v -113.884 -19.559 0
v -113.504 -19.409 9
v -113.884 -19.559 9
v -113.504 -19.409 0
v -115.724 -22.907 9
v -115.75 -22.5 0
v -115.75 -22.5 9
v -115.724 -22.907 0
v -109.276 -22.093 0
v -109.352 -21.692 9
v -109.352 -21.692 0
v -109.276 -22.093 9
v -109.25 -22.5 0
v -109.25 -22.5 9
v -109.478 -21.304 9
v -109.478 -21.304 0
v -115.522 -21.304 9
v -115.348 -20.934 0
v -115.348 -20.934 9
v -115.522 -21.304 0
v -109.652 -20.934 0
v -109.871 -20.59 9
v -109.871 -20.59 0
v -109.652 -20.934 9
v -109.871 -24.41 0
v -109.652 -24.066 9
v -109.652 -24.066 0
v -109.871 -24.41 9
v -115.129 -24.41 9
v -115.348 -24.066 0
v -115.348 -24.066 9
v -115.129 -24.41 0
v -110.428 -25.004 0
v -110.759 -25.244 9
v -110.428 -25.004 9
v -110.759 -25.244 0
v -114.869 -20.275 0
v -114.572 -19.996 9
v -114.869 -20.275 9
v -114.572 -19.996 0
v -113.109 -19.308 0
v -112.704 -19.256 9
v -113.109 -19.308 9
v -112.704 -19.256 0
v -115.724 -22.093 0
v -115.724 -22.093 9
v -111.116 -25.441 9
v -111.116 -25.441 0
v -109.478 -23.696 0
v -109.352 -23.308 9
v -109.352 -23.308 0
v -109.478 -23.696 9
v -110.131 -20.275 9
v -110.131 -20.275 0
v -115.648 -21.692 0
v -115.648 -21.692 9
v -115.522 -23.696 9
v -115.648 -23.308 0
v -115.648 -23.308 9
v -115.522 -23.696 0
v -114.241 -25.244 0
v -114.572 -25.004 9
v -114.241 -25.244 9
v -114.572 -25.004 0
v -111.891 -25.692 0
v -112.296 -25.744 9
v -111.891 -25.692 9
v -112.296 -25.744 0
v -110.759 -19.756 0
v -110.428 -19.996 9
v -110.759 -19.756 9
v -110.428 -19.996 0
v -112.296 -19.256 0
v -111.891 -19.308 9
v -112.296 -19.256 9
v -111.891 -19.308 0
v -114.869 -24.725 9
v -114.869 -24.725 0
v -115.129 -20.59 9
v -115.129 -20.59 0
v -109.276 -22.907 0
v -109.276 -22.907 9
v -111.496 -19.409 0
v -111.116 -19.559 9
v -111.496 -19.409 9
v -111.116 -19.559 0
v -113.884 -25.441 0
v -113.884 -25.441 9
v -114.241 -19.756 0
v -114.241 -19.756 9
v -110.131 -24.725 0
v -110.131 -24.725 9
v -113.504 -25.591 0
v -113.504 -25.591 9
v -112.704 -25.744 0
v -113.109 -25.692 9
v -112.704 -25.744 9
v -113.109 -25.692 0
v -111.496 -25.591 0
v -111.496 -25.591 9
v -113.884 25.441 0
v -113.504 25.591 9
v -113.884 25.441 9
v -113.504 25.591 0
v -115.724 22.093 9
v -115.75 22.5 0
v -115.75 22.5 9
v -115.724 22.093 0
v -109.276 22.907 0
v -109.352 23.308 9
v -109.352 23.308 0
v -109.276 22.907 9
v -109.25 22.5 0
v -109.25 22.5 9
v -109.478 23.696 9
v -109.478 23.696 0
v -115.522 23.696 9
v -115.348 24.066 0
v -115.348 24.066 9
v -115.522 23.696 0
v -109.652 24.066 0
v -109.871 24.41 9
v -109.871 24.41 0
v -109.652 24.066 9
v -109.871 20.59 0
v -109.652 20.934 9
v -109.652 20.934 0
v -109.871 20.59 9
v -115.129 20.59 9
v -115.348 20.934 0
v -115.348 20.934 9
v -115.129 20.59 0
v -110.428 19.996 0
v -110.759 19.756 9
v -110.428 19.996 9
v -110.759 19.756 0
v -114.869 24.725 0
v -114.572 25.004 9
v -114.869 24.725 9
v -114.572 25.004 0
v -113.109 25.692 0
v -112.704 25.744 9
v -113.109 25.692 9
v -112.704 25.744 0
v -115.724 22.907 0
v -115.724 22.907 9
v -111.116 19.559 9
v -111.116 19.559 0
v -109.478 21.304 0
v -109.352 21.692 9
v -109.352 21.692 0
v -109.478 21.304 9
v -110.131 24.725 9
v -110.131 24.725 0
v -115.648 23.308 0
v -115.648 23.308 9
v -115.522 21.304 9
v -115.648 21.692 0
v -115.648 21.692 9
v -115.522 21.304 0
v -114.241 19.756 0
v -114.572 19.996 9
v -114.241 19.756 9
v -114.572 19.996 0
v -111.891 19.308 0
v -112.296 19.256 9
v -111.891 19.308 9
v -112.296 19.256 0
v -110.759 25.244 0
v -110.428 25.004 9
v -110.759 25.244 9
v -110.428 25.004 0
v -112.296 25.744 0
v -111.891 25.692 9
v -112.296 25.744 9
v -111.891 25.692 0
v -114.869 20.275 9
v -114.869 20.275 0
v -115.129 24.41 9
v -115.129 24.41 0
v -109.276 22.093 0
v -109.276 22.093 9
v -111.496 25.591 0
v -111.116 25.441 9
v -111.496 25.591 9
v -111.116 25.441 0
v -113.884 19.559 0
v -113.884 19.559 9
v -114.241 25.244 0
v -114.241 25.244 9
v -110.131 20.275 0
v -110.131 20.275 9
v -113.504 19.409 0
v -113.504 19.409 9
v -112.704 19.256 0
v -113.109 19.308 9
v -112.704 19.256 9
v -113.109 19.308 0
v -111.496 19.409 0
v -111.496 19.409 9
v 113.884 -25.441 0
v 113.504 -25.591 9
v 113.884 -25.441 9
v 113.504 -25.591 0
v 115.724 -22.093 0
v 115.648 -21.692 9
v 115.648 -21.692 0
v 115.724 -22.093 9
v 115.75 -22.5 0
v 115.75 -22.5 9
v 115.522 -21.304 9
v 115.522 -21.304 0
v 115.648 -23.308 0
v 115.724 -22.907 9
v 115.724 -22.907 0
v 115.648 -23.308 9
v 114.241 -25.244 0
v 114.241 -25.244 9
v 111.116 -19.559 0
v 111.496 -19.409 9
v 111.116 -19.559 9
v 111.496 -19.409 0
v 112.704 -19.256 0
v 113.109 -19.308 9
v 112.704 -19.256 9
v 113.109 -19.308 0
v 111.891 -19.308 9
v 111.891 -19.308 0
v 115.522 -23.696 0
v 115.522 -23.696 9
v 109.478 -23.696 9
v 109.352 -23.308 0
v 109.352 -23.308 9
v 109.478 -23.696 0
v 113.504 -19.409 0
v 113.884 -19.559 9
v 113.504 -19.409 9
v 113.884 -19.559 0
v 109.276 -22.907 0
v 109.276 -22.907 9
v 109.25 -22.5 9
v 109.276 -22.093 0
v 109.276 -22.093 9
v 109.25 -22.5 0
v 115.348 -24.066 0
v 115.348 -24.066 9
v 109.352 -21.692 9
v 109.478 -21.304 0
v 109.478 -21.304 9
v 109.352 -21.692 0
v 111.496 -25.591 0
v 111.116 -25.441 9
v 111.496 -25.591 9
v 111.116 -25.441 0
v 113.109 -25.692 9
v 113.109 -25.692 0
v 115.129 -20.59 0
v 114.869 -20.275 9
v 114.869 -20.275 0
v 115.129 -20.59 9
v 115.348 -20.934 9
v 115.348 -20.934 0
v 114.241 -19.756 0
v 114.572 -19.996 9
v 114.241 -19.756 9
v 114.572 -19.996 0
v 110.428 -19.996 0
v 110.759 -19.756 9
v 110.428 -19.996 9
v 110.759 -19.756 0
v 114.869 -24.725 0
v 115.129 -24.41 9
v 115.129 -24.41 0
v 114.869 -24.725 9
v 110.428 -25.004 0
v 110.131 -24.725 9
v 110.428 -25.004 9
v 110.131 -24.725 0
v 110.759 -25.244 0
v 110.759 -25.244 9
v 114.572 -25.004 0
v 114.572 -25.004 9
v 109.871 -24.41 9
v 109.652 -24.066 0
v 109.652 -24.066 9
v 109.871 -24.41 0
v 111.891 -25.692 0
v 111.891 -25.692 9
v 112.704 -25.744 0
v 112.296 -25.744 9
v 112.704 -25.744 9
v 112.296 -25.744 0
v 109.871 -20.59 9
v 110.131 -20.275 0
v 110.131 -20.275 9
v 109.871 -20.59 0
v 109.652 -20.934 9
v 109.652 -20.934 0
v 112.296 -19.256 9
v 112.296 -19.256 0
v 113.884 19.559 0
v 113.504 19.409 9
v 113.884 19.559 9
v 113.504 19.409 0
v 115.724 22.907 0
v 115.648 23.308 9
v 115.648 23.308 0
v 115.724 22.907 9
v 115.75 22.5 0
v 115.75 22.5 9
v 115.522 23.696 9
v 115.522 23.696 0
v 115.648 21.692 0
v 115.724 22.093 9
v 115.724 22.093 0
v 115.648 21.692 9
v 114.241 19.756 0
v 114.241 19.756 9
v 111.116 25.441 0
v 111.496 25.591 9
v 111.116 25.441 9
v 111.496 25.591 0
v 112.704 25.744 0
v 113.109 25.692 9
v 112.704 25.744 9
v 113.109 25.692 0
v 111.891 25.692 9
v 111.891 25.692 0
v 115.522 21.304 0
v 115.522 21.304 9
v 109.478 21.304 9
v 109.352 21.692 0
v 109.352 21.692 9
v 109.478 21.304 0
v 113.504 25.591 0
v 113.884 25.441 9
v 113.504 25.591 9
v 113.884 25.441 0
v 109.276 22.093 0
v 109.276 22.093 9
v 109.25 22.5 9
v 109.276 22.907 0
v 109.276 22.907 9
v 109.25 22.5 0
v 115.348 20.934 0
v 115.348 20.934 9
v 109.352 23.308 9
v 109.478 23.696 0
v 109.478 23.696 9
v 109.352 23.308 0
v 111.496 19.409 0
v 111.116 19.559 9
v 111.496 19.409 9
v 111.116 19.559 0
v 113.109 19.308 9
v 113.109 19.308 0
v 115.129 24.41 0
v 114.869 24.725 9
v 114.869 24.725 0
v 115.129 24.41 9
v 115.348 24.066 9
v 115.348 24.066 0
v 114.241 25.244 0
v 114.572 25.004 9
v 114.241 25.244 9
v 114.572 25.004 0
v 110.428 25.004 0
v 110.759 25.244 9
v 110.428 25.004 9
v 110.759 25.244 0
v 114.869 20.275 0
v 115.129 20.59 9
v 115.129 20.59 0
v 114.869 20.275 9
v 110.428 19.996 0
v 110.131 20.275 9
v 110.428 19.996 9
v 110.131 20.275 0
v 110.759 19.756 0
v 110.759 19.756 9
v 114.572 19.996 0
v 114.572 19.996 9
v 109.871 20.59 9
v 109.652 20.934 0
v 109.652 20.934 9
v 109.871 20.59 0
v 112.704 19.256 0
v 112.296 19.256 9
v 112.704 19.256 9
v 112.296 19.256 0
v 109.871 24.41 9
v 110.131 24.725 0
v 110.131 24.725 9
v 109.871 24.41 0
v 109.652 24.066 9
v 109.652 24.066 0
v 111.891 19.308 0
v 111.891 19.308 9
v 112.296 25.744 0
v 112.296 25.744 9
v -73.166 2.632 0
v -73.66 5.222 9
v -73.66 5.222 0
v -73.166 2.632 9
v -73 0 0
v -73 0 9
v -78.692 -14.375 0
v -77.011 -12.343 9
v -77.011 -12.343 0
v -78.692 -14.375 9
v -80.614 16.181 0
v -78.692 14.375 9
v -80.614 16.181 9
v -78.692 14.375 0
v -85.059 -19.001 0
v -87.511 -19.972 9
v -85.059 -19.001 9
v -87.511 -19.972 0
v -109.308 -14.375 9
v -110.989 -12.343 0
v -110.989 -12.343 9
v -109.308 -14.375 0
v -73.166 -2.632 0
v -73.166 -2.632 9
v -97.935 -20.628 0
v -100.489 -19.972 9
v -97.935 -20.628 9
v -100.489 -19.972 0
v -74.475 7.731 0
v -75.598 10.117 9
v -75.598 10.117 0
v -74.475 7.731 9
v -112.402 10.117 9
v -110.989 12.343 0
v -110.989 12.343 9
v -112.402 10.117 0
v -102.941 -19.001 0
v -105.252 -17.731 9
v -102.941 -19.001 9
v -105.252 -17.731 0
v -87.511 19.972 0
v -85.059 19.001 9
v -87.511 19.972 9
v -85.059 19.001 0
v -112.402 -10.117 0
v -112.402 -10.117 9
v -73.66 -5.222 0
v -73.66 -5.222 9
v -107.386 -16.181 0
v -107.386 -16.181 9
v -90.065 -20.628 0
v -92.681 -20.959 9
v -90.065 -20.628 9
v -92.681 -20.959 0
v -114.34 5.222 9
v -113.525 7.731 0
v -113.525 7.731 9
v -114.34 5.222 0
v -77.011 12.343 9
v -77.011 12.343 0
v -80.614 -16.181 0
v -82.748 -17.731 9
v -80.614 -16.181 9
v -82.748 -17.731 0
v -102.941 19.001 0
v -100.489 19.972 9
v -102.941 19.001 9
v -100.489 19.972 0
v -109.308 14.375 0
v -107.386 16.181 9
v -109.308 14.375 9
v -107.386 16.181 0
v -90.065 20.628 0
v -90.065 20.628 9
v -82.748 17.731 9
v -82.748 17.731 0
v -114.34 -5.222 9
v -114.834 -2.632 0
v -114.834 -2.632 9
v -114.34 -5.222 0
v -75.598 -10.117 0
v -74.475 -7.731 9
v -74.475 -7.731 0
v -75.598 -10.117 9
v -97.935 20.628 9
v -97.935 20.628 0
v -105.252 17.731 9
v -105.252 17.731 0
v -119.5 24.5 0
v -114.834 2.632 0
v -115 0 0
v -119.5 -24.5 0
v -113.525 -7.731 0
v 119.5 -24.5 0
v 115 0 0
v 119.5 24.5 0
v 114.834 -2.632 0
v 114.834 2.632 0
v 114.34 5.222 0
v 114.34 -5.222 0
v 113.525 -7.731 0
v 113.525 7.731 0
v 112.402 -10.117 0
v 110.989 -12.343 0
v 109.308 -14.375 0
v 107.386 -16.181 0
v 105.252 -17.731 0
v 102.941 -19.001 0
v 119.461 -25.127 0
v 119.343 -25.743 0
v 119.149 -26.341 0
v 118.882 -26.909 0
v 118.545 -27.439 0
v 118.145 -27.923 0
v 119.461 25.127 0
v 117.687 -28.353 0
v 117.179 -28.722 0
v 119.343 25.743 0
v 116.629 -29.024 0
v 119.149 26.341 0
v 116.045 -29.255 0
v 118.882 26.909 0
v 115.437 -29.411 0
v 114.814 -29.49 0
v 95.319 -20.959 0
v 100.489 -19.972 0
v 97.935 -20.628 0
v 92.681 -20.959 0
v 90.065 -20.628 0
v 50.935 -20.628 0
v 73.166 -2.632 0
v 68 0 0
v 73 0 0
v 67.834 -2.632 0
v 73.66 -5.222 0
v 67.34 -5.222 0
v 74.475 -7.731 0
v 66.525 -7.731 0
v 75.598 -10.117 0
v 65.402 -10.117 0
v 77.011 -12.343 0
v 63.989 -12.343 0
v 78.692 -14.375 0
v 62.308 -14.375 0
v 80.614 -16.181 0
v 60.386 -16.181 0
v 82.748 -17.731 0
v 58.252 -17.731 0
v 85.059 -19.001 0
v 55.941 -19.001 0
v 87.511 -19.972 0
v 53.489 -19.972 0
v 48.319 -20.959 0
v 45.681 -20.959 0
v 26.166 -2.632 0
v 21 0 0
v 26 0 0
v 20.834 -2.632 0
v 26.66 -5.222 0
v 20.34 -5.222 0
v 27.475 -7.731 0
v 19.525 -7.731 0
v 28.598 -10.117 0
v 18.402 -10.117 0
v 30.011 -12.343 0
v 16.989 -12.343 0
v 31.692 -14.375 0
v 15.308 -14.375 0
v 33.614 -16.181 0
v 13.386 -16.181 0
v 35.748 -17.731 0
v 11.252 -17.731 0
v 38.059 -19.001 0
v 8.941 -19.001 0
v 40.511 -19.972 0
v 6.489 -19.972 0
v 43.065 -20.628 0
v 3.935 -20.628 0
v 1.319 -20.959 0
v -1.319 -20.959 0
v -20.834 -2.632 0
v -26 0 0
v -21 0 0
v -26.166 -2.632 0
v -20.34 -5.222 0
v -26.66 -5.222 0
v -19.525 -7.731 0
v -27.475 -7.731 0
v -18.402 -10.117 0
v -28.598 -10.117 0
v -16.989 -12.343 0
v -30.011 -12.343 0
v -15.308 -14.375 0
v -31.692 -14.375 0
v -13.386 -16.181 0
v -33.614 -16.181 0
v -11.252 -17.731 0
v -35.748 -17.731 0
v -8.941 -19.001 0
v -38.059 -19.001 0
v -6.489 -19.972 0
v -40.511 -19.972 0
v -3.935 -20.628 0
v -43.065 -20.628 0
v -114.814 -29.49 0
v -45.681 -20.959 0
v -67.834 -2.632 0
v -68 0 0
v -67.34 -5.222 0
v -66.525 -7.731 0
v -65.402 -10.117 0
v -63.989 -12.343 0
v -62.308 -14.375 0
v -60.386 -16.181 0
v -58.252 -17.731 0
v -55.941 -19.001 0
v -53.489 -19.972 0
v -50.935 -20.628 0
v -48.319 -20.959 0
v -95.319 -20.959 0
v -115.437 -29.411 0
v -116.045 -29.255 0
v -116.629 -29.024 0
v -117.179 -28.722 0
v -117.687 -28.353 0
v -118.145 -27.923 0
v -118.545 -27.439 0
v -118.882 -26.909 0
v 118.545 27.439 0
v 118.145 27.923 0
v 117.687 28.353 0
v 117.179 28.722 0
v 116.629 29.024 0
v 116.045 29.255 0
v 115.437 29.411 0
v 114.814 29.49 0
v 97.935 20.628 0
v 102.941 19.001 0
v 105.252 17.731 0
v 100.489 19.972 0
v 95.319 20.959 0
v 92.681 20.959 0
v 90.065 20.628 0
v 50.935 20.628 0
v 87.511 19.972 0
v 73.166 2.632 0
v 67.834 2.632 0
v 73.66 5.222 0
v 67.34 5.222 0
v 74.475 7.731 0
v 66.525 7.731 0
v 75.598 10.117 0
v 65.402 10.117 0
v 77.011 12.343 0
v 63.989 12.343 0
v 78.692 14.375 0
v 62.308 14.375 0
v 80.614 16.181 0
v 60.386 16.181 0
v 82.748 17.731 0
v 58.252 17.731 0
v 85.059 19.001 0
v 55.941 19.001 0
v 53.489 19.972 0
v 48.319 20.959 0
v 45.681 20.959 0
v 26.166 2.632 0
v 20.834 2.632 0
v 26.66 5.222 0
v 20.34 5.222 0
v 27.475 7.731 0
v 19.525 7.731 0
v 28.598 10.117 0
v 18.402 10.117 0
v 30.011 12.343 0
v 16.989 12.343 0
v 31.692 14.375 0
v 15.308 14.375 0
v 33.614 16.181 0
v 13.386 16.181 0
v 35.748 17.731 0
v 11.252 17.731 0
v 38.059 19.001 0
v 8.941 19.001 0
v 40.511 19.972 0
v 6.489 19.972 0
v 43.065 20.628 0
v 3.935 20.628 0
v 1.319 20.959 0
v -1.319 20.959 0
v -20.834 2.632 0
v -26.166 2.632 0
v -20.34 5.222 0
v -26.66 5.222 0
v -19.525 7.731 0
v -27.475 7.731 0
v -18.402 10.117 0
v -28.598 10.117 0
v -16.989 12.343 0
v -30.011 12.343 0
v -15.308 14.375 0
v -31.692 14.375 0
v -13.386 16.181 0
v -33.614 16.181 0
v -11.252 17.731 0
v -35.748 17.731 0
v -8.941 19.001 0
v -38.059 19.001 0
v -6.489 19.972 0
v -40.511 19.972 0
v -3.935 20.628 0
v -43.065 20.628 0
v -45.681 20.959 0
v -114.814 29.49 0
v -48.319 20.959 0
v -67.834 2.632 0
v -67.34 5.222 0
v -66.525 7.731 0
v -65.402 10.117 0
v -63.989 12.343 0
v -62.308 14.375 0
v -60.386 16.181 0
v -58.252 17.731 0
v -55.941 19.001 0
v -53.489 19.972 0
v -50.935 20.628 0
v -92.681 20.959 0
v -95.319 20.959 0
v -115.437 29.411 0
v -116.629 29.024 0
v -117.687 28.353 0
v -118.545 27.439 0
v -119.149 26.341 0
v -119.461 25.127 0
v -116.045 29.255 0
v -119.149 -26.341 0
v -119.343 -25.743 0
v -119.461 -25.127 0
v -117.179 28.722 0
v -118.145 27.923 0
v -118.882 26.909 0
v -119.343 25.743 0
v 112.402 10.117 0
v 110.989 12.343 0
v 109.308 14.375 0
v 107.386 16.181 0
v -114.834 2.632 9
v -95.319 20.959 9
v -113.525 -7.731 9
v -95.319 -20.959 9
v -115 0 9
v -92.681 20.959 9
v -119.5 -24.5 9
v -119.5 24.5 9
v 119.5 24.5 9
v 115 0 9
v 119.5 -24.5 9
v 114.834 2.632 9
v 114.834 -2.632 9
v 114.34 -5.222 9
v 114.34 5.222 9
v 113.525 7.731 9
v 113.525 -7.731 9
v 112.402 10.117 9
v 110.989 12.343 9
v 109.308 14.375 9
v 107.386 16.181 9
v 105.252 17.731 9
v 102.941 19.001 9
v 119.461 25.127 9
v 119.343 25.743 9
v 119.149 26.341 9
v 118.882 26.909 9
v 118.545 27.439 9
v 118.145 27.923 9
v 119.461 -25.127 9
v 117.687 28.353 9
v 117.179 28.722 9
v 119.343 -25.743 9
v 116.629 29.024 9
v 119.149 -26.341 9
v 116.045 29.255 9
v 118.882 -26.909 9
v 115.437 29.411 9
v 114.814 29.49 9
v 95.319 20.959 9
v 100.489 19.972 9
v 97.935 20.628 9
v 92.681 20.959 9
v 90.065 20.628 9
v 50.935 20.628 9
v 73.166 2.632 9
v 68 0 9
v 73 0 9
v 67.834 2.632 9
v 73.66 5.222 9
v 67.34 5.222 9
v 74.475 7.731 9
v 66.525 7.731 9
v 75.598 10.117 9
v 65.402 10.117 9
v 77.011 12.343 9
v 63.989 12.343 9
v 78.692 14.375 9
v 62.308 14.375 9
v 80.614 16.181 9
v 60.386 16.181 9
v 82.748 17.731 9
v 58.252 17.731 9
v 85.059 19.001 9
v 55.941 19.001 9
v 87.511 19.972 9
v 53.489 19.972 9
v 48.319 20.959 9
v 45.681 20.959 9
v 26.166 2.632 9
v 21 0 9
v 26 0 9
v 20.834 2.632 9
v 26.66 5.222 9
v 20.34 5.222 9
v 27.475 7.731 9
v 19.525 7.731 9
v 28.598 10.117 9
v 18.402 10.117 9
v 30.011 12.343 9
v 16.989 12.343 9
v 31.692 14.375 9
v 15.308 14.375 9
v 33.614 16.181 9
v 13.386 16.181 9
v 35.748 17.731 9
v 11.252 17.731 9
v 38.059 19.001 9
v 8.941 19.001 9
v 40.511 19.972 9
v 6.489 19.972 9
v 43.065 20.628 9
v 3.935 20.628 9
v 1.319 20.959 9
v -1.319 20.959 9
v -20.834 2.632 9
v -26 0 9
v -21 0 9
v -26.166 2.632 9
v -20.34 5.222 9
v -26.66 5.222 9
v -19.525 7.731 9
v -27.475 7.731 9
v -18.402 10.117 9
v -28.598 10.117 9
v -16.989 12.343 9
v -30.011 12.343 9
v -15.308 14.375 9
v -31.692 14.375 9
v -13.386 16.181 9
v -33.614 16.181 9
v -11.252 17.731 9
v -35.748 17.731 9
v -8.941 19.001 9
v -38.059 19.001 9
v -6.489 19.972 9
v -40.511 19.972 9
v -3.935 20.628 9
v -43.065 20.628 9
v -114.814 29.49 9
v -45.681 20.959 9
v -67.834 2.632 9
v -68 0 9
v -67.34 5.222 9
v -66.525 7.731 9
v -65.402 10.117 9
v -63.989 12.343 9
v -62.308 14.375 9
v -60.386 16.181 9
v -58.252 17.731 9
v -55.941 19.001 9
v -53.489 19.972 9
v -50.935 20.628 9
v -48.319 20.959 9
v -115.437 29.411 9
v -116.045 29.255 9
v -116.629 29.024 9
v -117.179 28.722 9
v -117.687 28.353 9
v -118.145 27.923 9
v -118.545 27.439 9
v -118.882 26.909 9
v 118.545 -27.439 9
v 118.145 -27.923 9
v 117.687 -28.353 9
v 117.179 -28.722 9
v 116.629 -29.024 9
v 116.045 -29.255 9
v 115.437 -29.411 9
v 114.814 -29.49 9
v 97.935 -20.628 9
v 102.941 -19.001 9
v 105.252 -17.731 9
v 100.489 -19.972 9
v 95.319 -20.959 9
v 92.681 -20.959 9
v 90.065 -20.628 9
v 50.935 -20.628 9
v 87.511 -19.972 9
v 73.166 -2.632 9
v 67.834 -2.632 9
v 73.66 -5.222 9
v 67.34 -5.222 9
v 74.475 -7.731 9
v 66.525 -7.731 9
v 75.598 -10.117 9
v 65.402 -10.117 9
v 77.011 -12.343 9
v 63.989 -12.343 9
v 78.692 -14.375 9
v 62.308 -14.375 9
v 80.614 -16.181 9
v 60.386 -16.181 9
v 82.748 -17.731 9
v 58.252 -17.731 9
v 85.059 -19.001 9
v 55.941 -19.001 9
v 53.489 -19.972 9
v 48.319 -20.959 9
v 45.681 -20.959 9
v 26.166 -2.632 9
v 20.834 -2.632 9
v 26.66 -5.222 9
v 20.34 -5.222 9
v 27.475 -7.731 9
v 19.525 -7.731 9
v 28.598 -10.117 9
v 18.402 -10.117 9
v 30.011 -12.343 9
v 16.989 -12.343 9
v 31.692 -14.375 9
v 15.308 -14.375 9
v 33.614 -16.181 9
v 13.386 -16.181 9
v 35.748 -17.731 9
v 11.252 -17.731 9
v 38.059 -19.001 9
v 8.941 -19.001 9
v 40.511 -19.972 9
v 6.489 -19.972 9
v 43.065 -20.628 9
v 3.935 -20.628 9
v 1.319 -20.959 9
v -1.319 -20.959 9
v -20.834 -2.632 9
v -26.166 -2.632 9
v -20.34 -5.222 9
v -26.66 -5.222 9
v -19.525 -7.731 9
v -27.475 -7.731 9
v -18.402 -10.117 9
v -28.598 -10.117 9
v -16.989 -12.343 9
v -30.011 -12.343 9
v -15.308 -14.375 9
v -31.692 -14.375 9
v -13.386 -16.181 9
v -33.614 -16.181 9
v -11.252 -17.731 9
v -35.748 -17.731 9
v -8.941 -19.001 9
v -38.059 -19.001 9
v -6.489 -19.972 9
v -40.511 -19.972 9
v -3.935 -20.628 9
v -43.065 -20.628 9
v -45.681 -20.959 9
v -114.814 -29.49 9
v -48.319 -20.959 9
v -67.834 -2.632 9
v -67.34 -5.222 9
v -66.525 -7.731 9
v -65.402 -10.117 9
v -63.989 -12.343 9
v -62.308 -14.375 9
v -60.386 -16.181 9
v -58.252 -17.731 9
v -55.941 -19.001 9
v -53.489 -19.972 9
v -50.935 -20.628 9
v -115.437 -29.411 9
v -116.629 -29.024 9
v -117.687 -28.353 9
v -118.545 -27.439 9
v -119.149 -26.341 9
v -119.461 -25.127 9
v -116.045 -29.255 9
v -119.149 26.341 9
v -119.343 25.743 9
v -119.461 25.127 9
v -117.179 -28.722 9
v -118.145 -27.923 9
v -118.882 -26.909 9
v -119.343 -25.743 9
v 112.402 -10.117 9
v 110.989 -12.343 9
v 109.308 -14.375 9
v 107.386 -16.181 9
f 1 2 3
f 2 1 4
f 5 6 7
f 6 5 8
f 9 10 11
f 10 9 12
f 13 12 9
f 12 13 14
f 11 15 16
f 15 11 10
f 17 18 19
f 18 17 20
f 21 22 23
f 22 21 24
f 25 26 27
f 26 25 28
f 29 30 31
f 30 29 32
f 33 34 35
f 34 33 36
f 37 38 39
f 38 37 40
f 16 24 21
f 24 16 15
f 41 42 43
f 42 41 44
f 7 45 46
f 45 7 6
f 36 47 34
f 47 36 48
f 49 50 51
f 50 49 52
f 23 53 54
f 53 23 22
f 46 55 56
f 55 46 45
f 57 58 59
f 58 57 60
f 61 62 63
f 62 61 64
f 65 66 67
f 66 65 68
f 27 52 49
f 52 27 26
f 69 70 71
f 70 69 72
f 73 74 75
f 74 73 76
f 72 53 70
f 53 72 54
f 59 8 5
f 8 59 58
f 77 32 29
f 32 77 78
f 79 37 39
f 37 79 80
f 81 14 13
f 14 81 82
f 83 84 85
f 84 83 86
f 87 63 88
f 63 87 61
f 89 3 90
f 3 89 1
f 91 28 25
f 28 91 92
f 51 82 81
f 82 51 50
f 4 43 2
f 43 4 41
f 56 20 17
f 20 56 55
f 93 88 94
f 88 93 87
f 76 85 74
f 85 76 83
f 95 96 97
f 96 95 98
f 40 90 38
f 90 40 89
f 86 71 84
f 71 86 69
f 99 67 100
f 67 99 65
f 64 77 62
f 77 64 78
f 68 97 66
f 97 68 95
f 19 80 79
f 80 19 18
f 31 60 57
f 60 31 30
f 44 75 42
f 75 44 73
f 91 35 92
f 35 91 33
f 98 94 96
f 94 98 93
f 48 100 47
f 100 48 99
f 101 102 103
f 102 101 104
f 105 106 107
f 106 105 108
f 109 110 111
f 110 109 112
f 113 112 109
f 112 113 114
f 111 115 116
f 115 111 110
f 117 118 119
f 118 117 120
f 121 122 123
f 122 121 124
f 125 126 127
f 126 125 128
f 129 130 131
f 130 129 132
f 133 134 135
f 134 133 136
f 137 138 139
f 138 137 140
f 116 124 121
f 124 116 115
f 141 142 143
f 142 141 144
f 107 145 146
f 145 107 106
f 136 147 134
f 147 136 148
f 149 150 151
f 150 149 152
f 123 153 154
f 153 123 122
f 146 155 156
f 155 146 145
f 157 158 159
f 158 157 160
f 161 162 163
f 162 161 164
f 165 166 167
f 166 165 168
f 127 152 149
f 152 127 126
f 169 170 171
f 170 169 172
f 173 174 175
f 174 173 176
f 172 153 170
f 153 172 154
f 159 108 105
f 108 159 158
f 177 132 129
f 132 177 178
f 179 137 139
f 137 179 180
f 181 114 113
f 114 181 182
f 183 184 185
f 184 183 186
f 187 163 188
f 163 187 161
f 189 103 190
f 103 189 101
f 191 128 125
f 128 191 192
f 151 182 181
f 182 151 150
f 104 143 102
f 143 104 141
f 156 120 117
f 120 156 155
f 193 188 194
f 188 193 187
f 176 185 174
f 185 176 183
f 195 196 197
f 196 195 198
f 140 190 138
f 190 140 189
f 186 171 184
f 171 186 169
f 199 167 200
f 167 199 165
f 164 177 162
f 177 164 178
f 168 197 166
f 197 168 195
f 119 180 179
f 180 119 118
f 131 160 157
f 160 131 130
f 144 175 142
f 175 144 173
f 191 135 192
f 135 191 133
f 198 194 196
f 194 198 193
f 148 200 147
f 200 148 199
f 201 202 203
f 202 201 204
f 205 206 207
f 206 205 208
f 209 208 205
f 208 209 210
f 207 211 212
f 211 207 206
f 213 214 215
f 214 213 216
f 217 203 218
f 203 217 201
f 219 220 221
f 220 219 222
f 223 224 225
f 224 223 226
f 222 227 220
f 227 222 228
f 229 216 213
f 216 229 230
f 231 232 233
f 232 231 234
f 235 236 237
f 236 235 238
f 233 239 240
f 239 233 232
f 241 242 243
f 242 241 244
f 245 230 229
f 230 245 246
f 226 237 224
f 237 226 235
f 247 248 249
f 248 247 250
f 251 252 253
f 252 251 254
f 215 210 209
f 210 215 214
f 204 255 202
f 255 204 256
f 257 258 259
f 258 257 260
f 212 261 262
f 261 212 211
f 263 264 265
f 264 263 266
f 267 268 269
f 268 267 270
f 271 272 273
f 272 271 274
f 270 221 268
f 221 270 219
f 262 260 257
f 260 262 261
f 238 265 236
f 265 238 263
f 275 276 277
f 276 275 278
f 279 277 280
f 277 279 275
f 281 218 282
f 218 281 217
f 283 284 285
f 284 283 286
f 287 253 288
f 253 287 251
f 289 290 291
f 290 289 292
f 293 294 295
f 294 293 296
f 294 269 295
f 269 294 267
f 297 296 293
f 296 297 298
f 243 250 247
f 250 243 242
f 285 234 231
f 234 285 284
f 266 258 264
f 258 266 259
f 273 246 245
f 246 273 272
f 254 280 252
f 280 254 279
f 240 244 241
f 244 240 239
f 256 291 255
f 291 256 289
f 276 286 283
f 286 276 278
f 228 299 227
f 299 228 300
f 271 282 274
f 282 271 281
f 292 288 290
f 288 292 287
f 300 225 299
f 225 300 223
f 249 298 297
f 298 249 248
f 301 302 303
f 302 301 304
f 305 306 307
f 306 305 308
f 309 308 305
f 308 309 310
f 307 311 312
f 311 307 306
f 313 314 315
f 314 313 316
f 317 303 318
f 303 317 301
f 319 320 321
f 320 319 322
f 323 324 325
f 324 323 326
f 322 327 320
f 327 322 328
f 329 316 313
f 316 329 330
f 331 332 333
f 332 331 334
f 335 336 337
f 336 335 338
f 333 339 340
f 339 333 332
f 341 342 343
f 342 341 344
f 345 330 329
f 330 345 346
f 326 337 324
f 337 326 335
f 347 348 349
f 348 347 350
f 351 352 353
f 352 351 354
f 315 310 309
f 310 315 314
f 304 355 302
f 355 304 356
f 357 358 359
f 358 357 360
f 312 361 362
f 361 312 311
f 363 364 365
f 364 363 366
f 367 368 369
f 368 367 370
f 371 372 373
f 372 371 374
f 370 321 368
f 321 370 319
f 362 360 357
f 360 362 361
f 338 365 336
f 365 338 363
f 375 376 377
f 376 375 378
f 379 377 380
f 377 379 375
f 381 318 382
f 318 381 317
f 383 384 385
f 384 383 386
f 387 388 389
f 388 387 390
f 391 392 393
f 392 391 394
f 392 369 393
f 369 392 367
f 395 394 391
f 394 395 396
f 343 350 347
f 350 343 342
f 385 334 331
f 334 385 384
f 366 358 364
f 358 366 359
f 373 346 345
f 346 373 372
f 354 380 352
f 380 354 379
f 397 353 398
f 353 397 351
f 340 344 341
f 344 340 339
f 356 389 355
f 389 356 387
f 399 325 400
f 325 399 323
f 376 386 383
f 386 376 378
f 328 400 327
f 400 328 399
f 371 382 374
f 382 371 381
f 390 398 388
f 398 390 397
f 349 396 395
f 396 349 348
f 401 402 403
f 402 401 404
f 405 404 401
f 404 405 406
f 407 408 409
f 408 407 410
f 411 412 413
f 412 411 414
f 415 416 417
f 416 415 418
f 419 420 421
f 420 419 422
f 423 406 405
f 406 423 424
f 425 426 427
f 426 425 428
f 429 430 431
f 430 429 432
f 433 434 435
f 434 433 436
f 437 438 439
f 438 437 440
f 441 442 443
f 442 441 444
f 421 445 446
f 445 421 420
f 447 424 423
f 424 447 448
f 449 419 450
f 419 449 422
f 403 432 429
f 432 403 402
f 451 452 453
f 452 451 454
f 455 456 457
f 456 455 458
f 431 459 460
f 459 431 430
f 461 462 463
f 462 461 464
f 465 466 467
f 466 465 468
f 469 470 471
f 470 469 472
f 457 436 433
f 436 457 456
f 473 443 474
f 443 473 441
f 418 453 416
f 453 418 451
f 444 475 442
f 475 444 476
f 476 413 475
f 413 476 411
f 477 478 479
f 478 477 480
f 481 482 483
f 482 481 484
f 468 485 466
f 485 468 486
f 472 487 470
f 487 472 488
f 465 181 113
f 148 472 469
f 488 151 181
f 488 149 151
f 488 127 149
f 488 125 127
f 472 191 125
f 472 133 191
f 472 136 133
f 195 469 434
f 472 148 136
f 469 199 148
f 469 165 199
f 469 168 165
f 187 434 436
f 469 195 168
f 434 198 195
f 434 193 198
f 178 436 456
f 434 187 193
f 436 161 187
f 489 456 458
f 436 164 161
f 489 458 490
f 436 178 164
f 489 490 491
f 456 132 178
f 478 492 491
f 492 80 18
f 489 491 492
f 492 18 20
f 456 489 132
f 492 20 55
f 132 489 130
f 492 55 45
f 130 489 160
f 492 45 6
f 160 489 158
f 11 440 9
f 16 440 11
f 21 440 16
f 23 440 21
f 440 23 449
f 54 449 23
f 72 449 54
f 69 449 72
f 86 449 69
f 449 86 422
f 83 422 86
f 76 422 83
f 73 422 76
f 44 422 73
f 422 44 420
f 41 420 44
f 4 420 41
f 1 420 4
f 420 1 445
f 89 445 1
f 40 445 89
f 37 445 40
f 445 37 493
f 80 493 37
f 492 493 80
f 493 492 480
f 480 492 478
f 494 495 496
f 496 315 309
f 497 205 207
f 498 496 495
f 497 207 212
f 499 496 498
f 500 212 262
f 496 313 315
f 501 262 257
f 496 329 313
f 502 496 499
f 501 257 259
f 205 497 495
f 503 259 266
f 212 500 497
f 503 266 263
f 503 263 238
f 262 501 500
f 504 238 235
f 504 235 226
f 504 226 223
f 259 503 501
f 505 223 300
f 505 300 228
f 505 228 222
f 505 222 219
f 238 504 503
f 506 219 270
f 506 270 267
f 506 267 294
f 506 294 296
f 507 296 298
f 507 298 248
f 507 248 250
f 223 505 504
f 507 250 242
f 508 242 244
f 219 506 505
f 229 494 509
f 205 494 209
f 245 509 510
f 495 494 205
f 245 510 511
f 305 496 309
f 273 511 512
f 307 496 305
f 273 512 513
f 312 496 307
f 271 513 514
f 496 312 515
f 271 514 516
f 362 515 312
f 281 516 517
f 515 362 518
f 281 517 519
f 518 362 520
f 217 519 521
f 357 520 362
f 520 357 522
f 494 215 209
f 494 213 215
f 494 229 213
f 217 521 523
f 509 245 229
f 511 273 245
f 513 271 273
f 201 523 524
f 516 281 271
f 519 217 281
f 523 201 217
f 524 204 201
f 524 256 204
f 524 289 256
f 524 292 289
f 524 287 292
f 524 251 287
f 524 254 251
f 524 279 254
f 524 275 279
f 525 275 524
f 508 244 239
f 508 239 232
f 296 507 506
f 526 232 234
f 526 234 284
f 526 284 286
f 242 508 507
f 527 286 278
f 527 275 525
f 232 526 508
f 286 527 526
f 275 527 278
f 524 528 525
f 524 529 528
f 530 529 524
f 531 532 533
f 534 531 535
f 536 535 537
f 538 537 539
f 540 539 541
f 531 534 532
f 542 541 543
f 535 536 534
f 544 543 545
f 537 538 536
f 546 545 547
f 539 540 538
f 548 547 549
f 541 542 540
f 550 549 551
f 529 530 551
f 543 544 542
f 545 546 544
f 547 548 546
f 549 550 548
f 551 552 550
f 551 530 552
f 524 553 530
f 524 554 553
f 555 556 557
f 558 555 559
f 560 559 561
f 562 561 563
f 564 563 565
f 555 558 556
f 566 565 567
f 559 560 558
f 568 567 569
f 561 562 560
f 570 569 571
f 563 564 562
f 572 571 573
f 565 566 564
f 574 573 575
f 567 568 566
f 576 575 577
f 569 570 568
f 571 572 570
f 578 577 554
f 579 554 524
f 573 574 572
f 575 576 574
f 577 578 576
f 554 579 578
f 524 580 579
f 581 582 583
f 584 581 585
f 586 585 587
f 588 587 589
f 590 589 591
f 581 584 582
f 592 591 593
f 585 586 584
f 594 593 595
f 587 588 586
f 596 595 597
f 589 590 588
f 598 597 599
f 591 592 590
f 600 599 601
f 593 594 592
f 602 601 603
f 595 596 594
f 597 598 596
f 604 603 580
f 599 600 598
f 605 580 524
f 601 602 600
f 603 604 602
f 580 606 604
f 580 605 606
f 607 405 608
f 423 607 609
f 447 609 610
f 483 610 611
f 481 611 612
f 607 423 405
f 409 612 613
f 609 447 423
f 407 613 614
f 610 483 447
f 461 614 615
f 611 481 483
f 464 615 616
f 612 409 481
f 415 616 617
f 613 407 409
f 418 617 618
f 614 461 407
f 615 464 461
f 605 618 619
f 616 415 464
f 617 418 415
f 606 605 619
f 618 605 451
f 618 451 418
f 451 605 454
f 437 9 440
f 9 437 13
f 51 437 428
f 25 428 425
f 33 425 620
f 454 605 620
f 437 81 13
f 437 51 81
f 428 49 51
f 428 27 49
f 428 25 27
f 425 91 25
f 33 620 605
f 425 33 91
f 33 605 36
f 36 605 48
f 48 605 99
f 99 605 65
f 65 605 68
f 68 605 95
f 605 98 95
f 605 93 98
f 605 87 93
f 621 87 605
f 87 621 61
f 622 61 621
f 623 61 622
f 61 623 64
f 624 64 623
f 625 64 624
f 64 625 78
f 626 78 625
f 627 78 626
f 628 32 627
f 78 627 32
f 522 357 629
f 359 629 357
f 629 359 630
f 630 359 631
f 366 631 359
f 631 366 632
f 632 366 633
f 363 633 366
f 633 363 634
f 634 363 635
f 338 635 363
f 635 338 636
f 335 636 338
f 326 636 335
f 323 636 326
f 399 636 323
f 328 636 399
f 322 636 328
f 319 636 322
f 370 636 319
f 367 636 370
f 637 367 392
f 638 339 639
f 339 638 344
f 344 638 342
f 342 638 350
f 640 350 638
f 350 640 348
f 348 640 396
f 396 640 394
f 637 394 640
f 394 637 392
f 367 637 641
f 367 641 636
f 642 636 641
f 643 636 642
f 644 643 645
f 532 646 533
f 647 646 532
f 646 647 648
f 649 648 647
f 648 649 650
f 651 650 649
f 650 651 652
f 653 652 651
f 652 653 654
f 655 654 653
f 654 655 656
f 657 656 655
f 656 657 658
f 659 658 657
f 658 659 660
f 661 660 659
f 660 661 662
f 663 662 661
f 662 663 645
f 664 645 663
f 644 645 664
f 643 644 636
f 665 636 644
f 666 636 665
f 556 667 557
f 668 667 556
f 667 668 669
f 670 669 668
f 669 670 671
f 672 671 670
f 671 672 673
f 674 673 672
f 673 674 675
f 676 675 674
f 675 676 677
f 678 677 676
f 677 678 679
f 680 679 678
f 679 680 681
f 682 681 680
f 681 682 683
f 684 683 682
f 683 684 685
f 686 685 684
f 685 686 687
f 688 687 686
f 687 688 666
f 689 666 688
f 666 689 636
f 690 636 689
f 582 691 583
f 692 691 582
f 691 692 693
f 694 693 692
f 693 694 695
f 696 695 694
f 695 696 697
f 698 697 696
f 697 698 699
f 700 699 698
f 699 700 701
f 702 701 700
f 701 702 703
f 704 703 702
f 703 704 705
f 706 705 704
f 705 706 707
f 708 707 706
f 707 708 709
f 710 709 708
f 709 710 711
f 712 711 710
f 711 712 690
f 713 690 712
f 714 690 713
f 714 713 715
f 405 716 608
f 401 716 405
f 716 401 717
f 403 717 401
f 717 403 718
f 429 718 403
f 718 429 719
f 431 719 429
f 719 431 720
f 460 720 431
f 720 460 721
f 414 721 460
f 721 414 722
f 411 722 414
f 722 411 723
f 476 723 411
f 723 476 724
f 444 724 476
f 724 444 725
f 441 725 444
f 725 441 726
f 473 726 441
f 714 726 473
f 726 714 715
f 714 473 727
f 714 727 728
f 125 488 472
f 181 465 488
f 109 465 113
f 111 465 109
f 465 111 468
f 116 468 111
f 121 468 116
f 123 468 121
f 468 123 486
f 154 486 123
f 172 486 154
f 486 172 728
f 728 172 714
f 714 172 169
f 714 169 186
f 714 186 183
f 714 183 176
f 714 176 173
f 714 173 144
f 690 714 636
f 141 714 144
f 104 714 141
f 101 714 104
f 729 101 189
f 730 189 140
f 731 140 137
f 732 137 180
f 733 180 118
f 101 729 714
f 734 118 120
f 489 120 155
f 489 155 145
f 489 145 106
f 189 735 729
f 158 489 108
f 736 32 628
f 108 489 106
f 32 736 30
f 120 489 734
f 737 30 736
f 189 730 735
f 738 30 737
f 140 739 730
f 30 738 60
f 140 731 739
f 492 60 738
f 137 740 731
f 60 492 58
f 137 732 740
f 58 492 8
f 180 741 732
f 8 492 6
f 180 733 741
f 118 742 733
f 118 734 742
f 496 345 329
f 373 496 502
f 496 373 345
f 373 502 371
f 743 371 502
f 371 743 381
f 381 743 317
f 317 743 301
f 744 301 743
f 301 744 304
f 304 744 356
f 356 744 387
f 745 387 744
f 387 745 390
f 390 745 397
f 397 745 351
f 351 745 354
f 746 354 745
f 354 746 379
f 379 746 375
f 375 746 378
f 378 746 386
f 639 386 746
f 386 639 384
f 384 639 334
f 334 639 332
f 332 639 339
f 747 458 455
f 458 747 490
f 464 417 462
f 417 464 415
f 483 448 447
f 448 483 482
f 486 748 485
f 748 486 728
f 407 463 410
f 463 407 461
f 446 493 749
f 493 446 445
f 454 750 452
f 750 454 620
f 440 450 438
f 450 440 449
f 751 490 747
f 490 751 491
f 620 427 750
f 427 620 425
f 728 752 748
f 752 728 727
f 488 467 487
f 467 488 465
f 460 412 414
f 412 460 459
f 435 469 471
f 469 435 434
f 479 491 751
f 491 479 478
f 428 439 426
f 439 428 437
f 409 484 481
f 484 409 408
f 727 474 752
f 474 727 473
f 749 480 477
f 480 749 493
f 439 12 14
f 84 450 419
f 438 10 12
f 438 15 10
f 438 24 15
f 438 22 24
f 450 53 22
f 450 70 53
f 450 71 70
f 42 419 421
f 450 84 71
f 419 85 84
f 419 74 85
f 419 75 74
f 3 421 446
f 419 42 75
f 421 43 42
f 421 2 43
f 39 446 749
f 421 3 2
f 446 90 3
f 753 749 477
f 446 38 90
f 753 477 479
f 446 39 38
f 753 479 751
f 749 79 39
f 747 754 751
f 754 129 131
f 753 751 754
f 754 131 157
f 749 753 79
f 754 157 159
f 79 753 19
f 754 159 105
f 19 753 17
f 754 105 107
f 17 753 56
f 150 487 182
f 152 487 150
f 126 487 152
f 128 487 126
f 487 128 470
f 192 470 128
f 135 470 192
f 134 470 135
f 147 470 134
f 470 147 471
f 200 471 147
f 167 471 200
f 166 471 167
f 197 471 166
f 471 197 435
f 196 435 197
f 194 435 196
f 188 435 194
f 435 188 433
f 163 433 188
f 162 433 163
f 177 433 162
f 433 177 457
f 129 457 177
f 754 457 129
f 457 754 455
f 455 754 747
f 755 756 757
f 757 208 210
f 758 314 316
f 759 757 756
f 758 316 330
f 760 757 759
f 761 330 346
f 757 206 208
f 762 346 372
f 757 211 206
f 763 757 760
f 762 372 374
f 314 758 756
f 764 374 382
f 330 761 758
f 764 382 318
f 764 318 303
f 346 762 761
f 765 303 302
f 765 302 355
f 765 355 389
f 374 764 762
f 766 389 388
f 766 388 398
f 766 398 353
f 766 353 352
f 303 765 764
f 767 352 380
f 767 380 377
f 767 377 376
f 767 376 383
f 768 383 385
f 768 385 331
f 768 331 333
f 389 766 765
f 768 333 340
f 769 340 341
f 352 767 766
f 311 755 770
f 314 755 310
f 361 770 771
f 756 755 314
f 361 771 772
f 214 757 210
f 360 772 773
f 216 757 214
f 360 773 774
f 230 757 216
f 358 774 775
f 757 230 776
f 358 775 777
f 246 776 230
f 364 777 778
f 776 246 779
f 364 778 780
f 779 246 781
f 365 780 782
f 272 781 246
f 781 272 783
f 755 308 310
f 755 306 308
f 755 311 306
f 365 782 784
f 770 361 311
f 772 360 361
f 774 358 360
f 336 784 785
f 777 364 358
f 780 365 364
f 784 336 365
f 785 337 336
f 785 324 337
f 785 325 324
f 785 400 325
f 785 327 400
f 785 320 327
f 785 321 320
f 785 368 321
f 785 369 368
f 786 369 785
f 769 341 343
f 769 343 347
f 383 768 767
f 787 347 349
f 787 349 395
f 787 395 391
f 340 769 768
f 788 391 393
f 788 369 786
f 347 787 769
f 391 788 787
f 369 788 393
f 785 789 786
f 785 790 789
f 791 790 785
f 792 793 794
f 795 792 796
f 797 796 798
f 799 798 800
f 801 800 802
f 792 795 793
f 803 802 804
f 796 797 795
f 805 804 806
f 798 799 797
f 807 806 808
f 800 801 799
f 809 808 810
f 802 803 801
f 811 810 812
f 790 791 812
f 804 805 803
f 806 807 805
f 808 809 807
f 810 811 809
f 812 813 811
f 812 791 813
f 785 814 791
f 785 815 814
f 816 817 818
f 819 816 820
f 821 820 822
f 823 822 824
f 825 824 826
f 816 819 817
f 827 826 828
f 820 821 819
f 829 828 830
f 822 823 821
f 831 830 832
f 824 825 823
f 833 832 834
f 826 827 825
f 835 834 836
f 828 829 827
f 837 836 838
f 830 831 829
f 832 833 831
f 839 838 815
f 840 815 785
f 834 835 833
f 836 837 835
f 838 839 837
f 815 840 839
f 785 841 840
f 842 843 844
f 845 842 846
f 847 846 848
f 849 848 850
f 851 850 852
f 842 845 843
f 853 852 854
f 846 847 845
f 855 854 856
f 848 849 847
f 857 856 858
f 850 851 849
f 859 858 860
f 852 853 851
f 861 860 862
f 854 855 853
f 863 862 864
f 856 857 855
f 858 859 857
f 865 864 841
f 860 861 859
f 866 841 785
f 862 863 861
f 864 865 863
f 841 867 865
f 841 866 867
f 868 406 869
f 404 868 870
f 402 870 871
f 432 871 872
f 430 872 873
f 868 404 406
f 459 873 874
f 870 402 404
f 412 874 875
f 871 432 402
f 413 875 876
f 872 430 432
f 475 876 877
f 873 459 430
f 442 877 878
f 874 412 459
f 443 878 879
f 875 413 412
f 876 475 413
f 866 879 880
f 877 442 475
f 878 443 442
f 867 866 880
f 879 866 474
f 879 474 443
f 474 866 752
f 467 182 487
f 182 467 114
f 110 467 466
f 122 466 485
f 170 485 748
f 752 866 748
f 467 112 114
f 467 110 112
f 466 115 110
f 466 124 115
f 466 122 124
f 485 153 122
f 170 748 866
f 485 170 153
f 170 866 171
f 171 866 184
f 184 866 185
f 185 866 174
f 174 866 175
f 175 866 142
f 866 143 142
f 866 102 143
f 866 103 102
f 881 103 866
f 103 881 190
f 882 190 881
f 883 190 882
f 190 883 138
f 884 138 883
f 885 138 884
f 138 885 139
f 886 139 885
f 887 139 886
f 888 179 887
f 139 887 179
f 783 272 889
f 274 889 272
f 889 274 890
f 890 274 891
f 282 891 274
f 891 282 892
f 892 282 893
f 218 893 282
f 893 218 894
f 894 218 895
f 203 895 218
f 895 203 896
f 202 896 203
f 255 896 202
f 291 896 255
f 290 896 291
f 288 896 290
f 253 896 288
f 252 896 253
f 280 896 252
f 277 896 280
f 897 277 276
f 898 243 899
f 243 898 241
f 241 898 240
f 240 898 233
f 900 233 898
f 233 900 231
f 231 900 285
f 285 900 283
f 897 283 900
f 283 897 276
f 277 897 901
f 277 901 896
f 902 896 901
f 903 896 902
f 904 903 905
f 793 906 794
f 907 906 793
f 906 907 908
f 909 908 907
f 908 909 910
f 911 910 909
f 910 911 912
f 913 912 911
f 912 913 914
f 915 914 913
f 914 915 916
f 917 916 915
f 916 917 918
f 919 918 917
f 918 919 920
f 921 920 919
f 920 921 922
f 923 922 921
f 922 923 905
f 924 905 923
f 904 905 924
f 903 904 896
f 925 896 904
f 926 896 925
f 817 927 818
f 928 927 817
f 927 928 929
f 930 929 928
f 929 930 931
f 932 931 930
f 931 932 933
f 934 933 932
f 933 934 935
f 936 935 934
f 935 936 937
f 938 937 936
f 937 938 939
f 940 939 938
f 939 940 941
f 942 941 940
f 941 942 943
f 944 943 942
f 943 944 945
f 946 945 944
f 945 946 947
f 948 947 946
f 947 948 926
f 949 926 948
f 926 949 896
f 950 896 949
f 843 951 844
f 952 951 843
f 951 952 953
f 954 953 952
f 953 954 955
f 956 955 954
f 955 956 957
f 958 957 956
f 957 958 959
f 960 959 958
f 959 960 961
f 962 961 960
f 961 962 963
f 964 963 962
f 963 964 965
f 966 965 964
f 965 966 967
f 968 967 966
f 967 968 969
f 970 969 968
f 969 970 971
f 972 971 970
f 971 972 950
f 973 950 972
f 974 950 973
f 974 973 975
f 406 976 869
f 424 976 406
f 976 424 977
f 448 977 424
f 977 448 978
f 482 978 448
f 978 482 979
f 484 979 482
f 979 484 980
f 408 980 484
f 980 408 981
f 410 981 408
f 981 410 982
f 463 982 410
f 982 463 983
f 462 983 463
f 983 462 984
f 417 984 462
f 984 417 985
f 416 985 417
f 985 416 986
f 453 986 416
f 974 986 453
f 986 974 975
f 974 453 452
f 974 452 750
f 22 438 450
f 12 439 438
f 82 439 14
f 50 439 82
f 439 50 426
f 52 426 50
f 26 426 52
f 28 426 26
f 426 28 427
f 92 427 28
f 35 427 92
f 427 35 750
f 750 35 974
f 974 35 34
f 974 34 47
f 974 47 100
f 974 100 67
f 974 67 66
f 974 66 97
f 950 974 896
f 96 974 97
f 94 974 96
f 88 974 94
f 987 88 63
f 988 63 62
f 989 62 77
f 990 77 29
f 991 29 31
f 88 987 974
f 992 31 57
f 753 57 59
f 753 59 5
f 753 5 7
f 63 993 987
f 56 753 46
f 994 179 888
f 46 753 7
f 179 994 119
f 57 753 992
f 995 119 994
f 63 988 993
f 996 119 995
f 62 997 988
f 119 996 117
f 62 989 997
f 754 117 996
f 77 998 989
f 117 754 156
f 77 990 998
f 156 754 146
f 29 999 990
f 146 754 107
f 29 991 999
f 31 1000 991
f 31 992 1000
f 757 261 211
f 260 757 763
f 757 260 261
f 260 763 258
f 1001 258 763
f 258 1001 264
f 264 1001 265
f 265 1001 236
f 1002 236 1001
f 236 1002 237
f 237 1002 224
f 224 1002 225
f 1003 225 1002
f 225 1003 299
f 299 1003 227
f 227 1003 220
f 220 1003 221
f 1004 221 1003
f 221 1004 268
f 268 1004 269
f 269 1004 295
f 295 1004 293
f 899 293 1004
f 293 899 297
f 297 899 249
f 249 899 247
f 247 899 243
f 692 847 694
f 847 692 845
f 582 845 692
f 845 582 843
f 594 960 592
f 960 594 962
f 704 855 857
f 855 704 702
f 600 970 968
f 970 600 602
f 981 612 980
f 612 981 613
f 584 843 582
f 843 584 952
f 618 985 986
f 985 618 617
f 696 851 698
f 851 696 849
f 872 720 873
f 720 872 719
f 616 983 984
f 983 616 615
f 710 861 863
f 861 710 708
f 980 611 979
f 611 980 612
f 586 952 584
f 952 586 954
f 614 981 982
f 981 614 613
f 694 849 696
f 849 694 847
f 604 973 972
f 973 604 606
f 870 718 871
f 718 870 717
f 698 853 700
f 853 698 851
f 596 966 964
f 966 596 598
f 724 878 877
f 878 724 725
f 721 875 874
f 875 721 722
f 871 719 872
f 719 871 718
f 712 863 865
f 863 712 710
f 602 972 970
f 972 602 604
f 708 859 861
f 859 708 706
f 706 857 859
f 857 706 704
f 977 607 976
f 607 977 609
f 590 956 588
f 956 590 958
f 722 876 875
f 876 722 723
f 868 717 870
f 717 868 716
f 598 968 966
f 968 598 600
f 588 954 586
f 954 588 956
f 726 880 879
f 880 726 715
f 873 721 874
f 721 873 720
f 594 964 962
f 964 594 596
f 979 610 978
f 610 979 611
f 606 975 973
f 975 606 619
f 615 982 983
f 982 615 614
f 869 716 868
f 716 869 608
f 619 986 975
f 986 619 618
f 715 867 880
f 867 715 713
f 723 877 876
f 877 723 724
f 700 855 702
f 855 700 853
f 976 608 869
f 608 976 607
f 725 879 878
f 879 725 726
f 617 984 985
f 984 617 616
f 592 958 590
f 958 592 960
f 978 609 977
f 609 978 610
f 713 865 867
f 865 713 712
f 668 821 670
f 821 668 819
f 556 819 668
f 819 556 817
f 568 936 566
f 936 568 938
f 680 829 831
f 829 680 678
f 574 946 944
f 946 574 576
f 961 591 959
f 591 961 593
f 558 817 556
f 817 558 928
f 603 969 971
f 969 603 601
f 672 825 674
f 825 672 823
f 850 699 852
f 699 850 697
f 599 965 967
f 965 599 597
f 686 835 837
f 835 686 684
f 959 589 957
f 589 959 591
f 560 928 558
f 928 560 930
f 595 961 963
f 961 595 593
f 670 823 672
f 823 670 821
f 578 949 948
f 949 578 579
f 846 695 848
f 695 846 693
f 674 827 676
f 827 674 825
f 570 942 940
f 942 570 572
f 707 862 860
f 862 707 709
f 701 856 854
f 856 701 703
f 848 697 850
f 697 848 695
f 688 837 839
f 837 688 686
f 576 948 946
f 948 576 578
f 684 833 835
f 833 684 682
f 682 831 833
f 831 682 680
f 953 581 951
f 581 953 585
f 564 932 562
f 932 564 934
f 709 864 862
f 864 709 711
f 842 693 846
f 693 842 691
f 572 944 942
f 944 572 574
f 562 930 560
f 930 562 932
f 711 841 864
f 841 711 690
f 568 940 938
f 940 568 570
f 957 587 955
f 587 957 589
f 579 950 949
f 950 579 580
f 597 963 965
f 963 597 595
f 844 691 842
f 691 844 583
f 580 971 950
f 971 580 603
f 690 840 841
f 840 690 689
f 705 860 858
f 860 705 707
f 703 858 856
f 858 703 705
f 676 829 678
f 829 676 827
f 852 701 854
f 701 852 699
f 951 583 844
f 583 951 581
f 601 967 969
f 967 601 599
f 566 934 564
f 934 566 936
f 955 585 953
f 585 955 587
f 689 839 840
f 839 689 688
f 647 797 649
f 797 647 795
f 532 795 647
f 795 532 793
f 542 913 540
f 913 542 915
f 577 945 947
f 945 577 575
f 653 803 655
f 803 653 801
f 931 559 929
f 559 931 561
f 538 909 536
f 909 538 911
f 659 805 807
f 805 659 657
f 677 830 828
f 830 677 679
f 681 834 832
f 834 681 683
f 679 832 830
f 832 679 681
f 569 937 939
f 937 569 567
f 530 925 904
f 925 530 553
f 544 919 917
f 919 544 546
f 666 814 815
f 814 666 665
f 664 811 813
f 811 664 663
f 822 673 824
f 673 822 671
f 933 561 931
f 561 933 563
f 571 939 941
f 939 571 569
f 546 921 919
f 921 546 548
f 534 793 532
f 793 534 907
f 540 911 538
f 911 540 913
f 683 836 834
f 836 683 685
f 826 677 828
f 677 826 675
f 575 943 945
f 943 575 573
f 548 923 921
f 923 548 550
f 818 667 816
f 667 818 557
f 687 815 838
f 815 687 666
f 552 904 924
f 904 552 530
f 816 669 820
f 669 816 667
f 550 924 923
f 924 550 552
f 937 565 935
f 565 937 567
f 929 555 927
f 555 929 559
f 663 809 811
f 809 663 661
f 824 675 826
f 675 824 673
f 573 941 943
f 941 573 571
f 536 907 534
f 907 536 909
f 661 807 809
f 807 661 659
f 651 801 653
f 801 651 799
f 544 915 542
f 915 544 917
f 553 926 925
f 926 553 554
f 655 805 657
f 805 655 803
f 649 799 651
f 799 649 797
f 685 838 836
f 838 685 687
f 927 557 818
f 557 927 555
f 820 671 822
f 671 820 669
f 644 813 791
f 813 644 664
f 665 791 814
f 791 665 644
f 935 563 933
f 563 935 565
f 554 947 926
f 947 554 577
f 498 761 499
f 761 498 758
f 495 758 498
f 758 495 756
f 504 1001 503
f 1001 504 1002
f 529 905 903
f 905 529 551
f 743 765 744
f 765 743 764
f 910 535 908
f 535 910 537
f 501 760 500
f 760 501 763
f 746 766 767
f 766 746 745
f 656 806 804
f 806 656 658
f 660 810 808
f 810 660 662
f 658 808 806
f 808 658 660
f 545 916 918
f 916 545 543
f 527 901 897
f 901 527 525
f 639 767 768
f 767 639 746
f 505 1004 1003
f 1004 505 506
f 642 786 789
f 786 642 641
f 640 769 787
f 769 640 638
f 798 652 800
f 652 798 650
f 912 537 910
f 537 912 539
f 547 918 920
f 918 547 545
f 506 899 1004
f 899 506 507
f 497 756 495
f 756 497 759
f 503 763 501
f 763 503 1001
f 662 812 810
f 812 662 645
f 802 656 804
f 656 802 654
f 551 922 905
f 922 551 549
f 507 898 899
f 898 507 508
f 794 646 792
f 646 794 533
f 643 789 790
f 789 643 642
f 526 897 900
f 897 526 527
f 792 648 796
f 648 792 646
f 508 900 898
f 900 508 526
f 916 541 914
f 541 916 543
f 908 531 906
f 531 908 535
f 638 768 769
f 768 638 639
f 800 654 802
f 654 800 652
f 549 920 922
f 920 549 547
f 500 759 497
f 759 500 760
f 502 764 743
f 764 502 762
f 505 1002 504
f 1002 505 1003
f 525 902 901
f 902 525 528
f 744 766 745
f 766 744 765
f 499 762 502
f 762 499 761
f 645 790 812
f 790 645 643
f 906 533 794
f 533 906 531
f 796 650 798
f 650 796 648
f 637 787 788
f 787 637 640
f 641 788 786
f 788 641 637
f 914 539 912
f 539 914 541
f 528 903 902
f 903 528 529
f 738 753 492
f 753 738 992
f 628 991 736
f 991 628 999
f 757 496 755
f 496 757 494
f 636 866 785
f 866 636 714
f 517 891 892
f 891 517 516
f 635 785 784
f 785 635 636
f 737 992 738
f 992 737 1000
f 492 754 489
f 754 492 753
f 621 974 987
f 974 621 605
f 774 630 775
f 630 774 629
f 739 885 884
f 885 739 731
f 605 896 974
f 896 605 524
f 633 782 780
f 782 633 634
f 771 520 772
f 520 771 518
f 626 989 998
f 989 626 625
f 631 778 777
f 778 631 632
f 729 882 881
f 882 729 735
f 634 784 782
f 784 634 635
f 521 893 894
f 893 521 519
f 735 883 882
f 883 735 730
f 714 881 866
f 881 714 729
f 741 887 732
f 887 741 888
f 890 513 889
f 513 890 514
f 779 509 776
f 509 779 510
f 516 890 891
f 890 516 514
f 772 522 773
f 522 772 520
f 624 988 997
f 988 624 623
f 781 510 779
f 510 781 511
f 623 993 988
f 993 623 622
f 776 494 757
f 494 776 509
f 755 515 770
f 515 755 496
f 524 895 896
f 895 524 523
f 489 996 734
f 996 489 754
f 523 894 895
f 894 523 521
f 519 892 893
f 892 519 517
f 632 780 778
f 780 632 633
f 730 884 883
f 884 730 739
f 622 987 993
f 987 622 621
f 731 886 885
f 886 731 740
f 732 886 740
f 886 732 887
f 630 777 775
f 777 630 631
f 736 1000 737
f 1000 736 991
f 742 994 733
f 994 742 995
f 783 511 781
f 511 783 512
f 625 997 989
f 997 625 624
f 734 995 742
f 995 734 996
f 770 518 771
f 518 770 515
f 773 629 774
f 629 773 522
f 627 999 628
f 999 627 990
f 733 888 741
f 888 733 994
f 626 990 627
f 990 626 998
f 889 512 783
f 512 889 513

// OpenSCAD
$fn = 50;


difference() {
	union() {
		hull() {
			translate(v = [-114.5000000000, 24.5000000000, 0]) {
				cylinder(h = 9, r = 5);
			}
			translate(v = [114.5000000000, 24.5000000000, 0]) {
				cylinder(h = 9, r = 5);
			}
			translate(v = [-114.5000000000, -24.5000000000, 0]) {
				cylinder(h = 9, r = 5);
			}
			translate(v = [114.5000000000, -24.5000000000, 0]) {
				cylinder(h = 9, r = 5);
			}
		}
	}
	union() {
		#translate(v = [-112.5000000000, -22.5000000000, -100.0000000000]) {
			cylinder(h = 200, r = 3.2500000000);
		}
		#translate(v = [-112.5000000000, 22.5000000000, -100.0000000000]) {
			cylinder(h = 200, r = 3.2500000000);
		}
		#translate(v = [112.5000000000, -22.5000000000, -100.0000000000]) {
			cylinder(h = 200, r = 3.2500000000);
		}
		#translate(v = [112.5000000000, 22.5000000000, -100.0000000000]) {
			cylinder(h = 200, r = 3.2500000000);
		}
		#translate(v = [-94.0000000000, 0, 0]) {
			cylinder(h = 9, r = 21.0000000000);
		}
		#translate(v = [-47.0000000000, 0, 0]) {
			cylinder(h = 9, r = 21.0000000000);
		}
		#cylinder(h = 9, r = 21.0000000000);
		#translate(v = [47.0000000000, 0, 0]) {
			cylinder(h = 9, r = 21.0000000000);
		}
		#translate(v = [94.0000000000, 0, 0]) {
			cylinder(h = 9, r = 21.0000000000);
		}
	}
}
